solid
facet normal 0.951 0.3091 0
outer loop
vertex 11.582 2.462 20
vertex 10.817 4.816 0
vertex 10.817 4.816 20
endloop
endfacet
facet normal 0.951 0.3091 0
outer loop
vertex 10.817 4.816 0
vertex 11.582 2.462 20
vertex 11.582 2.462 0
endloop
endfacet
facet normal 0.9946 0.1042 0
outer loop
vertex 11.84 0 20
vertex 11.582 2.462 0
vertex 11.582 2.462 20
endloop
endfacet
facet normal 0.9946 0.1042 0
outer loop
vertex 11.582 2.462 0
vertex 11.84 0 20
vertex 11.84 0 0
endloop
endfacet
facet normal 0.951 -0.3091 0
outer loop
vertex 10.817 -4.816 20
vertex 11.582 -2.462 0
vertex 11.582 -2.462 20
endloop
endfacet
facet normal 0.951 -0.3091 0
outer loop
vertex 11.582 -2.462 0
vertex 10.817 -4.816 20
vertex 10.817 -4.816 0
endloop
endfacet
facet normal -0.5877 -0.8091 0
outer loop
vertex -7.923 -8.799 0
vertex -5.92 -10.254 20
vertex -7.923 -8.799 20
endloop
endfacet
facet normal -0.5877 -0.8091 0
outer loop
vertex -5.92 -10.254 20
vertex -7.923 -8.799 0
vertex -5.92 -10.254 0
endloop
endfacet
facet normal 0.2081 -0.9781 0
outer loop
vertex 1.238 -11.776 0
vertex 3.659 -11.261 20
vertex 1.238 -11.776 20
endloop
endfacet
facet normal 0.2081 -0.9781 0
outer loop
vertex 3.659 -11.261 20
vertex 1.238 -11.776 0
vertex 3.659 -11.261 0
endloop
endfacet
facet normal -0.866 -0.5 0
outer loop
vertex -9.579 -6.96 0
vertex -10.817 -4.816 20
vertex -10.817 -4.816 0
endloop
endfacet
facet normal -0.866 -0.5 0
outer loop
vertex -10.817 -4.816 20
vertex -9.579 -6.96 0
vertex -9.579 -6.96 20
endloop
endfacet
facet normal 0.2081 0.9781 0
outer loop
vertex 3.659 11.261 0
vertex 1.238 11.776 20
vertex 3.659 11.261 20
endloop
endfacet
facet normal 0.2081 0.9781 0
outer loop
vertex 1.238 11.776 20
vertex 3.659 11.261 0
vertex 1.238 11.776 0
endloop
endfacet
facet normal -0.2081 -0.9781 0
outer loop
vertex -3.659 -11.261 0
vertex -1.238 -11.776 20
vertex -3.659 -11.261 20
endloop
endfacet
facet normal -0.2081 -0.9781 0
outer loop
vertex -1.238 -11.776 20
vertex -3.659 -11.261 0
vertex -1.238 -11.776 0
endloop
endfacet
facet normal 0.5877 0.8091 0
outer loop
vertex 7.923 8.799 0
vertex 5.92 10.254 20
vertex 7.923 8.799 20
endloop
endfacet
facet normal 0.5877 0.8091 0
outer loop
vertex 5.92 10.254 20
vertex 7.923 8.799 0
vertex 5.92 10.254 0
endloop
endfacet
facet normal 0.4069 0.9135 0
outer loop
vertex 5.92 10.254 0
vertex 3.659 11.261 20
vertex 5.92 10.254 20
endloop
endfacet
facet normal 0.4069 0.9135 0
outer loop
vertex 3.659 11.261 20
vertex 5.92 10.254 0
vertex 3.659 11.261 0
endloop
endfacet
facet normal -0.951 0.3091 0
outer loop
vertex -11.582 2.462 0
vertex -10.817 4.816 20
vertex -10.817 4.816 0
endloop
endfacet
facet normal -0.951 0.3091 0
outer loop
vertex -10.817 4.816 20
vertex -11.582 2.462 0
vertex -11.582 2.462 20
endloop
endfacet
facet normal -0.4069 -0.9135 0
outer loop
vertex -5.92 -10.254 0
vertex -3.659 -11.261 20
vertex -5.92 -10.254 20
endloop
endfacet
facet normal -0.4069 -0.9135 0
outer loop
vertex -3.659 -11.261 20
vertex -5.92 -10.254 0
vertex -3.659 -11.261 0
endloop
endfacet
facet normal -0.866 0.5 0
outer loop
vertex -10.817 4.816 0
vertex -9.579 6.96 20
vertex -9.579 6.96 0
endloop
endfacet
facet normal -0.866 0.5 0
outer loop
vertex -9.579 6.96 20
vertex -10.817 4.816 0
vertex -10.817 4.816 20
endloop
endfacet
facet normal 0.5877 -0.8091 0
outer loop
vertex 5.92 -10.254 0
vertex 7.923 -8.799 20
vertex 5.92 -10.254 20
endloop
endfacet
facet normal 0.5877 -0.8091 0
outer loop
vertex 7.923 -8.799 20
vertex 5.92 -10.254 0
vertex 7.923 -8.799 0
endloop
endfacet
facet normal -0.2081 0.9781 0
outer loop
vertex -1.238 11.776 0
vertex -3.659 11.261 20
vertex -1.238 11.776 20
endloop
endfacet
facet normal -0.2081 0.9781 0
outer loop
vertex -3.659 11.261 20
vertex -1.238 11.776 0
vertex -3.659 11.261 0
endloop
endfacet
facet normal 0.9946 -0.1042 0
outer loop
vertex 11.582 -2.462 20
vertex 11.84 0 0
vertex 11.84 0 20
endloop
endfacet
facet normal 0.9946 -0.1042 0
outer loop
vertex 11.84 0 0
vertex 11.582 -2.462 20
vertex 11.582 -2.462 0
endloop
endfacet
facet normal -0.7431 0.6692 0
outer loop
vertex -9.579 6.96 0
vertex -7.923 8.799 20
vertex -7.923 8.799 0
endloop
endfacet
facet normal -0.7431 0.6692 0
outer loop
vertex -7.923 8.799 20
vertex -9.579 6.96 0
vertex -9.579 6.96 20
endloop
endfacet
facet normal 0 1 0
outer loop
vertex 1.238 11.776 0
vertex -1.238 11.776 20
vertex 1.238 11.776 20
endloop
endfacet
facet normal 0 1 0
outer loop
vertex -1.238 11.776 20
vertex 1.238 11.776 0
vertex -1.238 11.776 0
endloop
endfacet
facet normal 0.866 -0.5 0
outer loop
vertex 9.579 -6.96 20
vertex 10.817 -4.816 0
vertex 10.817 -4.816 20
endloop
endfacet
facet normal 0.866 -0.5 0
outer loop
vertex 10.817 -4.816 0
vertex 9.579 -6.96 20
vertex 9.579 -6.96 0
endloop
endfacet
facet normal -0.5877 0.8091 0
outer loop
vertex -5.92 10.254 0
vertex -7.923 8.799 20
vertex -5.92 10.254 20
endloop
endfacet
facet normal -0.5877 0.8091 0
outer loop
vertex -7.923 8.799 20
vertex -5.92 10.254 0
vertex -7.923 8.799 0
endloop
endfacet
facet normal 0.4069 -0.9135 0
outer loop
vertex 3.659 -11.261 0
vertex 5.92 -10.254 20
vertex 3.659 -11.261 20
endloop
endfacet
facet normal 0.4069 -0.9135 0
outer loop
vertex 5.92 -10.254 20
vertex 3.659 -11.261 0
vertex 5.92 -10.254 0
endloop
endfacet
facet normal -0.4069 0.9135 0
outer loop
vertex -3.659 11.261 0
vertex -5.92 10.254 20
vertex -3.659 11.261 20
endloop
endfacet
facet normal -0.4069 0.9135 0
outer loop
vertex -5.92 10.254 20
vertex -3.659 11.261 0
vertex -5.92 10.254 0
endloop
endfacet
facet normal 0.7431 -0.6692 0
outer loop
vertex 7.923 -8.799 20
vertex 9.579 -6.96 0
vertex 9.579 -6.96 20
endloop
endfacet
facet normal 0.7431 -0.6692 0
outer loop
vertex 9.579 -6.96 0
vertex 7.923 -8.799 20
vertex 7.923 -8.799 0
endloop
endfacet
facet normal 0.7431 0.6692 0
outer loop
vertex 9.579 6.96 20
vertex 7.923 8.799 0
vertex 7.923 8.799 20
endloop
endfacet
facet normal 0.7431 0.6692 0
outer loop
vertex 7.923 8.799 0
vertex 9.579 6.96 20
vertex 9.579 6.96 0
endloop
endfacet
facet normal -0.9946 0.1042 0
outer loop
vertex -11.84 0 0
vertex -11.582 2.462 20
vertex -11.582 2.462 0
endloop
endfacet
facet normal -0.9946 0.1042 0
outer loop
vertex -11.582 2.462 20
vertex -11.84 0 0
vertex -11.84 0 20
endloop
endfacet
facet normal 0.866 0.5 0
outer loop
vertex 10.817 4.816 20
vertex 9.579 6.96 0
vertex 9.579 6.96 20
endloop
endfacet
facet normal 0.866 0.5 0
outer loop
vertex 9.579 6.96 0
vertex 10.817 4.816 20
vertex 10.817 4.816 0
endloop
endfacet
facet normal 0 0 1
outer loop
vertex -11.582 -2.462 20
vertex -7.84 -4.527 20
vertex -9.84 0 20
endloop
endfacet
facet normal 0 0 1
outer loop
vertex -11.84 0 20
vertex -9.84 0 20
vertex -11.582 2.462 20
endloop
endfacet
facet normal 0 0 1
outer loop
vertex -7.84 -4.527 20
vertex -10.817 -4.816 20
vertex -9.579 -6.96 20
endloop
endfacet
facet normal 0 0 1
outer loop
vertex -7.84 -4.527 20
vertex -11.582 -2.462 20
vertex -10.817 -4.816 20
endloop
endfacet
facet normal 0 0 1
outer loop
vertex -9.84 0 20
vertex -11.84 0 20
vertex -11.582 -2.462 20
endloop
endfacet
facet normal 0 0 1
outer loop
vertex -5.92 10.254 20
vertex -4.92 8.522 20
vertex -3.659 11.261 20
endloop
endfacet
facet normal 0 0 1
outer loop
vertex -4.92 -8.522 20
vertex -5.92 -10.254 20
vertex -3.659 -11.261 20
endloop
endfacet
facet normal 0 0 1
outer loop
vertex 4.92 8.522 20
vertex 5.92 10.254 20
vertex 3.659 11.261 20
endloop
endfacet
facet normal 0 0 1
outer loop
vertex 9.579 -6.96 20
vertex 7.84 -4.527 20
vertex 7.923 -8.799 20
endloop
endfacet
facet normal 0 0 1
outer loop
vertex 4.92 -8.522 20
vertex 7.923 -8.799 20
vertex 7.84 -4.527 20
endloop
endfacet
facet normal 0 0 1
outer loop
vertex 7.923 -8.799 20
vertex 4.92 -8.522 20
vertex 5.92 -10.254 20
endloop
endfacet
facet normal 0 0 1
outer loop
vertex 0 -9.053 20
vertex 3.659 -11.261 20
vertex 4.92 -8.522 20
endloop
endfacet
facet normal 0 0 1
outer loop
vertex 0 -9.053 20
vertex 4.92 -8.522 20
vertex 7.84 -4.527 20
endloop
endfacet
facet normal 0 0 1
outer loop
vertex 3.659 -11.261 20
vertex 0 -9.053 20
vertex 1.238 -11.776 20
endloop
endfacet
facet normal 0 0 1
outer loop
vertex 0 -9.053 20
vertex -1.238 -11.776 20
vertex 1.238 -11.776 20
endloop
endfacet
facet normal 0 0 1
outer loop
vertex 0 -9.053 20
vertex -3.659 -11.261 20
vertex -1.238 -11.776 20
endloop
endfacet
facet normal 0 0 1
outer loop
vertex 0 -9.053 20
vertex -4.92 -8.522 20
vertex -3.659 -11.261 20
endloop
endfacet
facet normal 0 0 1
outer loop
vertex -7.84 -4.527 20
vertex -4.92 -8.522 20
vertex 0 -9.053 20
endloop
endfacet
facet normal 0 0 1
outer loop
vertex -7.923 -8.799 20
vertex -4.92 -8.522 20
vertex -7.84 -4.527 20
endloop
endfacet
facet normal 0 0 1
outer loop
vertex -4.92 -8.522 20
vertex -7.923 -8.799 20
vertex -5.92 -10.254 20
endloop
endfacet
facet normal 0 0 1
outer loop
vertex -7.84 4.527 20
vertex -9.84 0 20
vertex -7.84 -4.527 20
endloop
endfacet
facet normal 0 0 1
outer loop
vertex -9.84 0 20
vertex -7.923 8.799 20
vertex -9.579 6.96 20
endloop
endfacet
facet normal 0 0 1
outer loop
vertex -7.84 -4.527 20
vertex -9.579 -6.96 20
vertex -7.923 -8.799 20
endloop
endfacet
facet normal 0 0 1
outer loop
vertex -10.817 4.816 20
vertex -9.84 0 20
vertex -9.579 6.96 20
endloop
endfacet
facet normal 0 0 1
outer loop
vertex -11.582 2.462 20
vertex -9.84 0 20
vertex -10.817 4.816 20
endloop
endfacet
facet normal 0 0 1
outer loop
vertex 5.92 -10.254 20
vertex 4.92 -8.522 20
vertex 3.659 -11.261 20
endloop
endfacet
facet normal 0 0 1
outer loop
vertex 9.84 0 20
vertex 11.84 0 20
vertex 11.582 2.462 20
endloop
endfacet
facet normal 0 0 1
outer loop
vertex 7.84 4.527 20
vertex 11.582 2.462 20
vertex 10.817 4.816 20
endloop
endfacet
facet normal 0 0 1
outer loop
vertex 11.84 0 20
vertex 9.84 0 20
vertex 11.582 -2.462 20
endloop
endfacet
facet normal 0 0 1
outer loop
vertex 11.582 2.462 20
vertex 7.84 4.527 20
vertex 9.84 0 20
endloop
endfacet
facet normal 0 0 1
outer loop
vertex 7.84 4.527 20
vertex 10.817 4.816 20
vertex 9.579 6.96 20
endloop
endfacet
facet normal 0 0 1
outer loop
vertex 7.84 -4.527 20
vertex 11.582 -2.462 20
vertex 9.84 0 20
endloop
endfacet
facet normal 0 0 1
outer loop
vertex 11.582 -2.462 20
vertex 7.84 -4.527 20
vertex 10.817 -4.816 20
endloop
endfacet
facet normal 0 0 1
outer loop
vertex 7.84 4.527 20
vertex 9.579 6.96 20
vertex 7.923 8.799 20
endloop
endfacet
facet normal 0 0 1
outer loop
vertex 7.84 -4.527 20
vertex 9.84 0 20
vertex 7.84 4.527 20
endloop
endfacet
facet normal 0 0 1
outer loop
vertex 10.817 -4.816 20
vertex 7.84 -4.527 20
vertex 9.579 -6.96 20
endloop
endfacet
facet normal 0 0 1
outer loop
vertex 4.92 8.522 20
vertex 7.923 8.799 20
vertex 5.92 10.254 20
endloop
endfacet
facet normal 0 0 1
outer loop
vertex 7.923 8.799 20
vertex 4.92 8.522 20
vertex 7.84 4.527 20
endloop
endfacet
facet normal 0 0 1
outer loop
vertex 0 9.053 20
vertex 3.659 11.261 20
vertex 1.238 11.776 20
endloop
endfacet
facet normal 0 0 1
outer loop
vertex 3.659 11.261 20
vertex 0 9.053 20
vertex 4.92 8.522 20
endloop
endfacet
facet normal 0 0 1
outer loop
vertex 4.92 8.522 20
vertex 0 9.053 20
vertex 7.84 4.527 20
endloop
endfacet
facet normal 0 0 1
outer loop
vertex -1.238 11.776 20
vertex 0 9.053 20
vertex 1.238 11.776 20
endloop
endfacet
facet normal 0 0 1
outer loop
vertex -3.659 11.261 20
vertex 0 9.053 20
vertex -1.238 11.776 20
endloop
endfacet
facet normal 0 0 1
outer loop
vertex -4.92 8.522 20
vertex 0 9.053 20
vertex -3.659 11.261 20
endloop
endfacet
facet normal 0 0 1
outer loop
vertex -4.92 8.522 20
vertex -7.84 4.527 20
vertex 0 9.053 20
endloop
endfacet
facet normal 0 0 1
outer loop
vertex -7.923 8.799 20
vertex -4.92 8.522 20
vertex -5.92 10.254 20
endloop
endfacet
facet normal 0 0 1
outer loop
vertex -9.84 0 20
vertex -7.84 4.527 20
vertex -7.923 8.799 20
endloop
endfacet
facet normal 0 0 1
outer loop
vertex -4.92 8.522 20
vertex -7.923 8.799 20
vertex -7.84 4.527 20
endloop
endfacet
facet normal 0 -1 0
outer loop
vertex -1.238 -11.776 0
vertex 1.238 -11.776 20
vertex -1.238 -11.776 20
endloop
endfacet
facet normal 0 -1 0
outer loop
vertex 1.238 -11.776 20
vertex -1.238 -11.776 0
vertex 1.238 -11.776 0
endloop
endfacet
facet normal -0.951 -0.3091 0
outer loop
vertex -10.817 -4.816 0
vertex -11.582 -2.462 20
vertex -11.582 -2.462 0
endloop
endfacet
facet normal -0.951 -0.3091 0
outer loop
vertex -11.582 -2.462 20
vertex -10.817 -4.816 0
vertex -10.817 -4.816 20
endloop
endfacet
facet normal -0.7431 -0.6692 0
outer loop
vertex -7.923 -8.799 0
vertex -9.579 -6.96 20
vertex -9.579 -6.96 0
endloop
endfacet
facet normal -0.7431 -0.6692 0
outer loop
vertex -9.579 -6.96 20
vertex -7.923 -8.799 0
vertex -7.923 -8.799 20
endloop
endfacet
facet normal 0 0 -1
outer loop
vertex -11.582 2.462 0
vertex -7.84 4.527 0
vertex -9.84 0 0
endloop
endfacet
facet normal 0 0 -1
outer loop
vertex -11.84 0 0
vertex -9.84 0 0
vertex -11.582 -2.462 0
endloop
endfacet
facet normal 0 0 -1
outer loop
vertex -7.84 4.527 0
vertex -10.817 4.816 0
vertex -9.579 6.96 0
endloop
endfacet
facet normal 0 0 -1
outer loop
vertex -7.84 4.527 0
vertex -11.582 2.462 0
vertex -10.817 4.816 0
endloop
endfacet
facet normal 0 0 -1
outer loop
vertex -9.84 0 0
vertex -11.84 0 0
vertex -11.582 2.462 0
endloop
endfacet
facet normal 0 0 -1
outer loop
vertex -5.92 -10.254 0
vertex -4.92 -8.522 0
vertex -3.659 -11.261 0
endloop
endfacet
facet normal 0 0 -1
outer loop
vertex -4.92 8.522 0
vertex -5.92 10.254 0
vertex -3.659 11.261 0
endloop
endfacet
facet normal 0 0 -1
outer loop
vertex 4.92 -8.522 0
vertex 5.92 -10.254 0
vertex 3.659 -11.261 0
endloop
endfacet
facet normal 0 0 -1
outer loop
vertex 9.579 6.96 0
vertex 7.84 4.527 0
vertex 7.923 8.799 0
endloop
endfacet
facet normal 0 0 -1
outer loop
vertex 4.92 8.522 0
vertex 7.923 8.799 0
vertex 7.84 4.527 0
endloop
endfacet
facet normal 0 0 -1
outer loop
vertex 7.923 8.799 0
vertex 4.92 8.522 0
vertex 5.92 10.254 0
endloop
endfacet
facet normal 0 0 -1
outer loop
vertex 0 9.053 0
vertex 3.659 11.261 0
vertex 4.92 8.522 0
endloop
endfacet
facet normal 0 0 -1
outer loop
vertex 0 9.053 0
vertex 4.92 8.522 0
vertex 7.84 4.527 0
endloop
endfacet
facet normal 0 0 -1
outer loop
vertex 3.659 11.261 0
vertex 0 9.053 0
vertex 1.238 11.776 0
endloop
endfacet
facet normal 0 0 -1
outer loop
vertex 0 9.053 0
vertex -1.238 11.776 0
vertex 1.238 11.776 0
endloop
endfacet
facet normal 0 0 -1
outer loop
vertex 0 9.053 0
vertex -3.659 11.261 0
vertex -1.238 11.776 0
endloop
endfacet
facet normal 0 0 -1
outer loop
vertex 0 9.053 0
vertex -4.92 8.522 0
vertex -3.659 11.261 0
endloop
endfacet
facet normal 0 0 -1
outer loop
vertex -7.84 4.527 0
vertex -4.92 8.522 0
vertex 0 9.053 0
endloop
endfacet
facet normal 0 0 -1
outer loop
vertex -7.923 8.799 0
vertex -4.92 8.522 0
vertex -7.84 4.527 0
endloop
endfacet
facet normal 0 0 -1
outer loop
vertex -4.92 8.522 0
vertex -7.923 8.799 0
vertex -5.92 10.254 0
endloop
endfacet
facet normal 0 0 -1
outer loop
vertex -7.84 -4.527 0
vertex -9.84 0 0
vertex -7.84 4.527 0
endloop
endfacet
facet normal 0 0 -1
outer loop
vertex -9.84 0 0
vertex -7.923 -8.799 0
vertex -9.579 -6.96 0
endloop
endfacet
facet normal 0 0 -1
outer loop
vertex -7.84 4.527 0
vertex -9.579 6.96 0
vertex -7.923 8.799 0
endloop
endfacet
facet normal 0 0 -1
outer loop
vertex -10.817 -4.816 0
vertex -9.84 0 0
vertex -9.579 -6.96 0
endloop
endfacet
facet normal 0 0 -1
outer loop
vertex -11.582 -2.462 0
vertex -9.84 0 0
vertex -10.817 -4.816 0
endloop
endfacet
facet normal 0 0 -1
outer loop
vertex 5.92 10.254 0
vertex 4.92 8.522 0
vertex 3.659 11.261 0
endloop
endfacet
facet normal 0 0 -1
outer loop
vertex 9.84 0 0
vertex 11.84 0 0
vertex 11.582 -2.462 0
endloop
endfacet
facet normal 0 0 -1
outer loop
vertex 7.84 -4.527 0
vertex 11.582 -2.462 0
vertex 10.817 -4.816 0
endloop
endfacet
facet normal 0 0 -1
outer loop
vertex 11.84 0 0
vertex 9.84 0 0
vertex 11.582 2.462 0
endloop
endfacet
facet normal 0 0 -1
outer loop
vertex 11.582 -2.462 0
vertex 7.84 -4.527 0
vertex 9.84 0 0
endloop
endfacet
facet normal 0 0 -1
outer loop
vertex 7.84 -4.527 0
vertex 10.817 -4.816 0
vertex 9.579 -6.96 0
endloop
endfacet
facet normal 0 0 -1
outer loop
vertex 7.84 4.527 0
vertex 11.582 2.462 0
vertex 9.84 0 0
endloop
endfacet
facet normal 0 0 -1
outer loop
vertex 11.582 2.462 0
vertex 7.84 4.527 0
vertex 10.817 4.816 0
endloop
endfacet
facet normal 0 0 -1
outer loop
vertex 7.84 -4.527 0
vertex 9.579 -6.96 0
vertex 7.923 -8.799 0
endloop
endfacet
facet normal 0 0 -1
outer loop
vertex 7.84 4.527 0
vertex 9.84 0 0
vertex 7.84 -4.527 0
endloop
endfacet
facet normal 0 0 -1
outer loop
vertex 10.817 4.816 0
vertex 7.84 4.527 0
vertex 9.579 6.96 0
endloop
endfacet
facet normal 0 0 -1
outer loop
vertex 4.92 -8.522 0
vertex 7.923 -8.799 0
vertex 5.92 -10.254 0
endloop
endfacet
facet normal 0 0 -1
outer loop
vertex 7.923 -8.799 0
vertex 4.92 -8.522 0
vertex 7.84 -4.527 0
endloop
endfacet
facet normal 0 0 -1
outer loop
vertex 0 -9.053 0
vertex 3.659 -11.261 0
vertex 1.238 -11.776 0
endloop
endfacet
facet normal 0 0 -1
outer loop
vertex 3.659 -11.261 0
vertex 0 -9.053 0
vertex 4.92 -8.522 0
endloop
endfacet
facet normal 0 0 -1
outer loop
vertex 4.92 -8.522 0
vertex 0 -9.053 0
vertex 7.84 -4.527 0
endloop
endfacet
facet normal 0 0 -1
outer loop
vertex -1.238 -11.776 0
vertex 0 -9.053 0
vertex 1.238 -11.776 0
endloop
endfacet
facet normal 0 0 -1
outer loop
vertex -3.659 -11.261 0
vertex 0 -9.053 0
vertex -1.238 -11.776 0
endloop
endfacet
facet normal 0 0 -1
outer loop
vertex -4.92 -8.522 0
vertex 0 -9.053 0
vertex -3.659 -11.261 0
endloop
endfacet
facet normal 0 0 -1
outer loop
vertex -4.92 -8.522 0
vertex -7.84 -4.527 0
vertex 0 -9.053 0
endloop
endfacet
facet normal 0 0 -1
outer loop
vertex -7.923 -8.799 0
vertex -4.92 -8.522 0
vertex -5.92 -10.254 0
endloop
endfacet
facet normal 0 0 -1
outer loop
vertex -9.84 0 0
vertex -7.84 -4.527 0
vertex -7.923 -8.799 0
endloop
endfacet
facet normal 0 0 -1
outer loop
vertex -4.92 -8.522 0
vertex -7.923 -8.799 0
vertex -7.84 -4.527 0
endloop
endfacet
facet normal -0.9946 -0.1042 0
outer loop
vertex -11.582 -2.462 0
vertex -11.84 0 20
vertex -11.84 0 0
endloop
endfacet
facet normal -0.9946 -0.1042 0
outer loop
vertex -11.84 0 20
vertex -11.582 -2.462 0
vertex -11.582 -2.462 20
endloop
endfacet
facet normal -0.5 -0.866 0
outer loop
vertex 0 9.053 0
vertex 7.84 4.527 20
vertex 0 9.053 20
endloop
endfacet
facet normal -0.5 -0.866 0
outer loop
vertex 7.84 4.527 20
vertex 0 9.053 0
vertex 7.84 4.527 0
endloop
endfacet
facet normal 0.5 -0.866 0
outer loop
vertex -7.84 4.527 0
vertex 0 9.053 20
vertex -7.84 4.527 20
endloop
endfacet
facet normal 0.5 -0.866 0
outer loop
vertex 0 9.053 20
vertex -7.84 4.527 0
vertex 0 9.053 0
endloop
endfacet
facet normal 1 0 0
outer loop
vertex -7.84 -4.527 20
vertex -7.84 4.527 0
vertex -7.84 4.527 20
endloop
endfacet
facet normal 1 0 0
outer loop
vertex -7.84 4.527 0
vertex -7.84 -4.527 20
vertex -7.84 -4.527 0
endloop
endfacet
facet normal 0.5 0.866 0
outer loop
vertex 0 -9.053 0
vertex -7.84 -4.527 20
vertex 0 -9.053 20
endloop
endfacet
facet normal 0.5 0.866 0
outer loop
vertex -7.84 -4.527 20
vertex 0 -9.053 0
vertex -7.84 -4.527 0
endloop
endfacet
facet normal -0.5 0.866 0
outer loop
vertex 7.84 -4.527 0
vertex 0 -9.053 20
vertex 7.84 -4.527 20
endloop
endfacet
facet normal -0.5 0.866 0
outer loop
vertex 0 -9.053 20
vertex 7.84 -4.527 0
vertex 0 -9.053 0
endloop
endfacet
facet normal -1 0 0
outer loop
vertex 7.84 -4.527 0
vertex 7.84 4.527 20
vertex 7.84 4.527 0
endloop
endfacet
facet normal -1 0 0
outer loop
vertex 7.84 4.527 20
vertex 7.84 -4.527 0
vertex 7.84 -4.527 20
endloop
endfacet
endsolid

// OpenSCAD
module hexagon(r=1,h=1,x=0,y=0){
linear_extrude(height = h) {
polygon(points=[[(r+x),(r*(tan(30)))+y],
                [x,(r*(2/sqrt(3)))+y],
                [-r+x,(r*(tan(30)))+y],
                [-
    r+x,-(r*(tan(30)))+y],
                [x,-(r*(2/sqrt(3)))+y], 
                [r+x,-(r*(tan(30)))+y]]);
         
 }
 }
 
d = (13.57+13.62+13.55)/3;
r = d/2;
R = r/cos(30);
R2 = R+2;

L = 20;
difference() {
cylinder(h=L, r=R2+2, center=false);
cylinder(h=L, r=R2, center=false);

}

difference() {
color("blue") {
hexagon(R+2,L, 0,0);
}
hexagon(R,L, 0,0);
}
